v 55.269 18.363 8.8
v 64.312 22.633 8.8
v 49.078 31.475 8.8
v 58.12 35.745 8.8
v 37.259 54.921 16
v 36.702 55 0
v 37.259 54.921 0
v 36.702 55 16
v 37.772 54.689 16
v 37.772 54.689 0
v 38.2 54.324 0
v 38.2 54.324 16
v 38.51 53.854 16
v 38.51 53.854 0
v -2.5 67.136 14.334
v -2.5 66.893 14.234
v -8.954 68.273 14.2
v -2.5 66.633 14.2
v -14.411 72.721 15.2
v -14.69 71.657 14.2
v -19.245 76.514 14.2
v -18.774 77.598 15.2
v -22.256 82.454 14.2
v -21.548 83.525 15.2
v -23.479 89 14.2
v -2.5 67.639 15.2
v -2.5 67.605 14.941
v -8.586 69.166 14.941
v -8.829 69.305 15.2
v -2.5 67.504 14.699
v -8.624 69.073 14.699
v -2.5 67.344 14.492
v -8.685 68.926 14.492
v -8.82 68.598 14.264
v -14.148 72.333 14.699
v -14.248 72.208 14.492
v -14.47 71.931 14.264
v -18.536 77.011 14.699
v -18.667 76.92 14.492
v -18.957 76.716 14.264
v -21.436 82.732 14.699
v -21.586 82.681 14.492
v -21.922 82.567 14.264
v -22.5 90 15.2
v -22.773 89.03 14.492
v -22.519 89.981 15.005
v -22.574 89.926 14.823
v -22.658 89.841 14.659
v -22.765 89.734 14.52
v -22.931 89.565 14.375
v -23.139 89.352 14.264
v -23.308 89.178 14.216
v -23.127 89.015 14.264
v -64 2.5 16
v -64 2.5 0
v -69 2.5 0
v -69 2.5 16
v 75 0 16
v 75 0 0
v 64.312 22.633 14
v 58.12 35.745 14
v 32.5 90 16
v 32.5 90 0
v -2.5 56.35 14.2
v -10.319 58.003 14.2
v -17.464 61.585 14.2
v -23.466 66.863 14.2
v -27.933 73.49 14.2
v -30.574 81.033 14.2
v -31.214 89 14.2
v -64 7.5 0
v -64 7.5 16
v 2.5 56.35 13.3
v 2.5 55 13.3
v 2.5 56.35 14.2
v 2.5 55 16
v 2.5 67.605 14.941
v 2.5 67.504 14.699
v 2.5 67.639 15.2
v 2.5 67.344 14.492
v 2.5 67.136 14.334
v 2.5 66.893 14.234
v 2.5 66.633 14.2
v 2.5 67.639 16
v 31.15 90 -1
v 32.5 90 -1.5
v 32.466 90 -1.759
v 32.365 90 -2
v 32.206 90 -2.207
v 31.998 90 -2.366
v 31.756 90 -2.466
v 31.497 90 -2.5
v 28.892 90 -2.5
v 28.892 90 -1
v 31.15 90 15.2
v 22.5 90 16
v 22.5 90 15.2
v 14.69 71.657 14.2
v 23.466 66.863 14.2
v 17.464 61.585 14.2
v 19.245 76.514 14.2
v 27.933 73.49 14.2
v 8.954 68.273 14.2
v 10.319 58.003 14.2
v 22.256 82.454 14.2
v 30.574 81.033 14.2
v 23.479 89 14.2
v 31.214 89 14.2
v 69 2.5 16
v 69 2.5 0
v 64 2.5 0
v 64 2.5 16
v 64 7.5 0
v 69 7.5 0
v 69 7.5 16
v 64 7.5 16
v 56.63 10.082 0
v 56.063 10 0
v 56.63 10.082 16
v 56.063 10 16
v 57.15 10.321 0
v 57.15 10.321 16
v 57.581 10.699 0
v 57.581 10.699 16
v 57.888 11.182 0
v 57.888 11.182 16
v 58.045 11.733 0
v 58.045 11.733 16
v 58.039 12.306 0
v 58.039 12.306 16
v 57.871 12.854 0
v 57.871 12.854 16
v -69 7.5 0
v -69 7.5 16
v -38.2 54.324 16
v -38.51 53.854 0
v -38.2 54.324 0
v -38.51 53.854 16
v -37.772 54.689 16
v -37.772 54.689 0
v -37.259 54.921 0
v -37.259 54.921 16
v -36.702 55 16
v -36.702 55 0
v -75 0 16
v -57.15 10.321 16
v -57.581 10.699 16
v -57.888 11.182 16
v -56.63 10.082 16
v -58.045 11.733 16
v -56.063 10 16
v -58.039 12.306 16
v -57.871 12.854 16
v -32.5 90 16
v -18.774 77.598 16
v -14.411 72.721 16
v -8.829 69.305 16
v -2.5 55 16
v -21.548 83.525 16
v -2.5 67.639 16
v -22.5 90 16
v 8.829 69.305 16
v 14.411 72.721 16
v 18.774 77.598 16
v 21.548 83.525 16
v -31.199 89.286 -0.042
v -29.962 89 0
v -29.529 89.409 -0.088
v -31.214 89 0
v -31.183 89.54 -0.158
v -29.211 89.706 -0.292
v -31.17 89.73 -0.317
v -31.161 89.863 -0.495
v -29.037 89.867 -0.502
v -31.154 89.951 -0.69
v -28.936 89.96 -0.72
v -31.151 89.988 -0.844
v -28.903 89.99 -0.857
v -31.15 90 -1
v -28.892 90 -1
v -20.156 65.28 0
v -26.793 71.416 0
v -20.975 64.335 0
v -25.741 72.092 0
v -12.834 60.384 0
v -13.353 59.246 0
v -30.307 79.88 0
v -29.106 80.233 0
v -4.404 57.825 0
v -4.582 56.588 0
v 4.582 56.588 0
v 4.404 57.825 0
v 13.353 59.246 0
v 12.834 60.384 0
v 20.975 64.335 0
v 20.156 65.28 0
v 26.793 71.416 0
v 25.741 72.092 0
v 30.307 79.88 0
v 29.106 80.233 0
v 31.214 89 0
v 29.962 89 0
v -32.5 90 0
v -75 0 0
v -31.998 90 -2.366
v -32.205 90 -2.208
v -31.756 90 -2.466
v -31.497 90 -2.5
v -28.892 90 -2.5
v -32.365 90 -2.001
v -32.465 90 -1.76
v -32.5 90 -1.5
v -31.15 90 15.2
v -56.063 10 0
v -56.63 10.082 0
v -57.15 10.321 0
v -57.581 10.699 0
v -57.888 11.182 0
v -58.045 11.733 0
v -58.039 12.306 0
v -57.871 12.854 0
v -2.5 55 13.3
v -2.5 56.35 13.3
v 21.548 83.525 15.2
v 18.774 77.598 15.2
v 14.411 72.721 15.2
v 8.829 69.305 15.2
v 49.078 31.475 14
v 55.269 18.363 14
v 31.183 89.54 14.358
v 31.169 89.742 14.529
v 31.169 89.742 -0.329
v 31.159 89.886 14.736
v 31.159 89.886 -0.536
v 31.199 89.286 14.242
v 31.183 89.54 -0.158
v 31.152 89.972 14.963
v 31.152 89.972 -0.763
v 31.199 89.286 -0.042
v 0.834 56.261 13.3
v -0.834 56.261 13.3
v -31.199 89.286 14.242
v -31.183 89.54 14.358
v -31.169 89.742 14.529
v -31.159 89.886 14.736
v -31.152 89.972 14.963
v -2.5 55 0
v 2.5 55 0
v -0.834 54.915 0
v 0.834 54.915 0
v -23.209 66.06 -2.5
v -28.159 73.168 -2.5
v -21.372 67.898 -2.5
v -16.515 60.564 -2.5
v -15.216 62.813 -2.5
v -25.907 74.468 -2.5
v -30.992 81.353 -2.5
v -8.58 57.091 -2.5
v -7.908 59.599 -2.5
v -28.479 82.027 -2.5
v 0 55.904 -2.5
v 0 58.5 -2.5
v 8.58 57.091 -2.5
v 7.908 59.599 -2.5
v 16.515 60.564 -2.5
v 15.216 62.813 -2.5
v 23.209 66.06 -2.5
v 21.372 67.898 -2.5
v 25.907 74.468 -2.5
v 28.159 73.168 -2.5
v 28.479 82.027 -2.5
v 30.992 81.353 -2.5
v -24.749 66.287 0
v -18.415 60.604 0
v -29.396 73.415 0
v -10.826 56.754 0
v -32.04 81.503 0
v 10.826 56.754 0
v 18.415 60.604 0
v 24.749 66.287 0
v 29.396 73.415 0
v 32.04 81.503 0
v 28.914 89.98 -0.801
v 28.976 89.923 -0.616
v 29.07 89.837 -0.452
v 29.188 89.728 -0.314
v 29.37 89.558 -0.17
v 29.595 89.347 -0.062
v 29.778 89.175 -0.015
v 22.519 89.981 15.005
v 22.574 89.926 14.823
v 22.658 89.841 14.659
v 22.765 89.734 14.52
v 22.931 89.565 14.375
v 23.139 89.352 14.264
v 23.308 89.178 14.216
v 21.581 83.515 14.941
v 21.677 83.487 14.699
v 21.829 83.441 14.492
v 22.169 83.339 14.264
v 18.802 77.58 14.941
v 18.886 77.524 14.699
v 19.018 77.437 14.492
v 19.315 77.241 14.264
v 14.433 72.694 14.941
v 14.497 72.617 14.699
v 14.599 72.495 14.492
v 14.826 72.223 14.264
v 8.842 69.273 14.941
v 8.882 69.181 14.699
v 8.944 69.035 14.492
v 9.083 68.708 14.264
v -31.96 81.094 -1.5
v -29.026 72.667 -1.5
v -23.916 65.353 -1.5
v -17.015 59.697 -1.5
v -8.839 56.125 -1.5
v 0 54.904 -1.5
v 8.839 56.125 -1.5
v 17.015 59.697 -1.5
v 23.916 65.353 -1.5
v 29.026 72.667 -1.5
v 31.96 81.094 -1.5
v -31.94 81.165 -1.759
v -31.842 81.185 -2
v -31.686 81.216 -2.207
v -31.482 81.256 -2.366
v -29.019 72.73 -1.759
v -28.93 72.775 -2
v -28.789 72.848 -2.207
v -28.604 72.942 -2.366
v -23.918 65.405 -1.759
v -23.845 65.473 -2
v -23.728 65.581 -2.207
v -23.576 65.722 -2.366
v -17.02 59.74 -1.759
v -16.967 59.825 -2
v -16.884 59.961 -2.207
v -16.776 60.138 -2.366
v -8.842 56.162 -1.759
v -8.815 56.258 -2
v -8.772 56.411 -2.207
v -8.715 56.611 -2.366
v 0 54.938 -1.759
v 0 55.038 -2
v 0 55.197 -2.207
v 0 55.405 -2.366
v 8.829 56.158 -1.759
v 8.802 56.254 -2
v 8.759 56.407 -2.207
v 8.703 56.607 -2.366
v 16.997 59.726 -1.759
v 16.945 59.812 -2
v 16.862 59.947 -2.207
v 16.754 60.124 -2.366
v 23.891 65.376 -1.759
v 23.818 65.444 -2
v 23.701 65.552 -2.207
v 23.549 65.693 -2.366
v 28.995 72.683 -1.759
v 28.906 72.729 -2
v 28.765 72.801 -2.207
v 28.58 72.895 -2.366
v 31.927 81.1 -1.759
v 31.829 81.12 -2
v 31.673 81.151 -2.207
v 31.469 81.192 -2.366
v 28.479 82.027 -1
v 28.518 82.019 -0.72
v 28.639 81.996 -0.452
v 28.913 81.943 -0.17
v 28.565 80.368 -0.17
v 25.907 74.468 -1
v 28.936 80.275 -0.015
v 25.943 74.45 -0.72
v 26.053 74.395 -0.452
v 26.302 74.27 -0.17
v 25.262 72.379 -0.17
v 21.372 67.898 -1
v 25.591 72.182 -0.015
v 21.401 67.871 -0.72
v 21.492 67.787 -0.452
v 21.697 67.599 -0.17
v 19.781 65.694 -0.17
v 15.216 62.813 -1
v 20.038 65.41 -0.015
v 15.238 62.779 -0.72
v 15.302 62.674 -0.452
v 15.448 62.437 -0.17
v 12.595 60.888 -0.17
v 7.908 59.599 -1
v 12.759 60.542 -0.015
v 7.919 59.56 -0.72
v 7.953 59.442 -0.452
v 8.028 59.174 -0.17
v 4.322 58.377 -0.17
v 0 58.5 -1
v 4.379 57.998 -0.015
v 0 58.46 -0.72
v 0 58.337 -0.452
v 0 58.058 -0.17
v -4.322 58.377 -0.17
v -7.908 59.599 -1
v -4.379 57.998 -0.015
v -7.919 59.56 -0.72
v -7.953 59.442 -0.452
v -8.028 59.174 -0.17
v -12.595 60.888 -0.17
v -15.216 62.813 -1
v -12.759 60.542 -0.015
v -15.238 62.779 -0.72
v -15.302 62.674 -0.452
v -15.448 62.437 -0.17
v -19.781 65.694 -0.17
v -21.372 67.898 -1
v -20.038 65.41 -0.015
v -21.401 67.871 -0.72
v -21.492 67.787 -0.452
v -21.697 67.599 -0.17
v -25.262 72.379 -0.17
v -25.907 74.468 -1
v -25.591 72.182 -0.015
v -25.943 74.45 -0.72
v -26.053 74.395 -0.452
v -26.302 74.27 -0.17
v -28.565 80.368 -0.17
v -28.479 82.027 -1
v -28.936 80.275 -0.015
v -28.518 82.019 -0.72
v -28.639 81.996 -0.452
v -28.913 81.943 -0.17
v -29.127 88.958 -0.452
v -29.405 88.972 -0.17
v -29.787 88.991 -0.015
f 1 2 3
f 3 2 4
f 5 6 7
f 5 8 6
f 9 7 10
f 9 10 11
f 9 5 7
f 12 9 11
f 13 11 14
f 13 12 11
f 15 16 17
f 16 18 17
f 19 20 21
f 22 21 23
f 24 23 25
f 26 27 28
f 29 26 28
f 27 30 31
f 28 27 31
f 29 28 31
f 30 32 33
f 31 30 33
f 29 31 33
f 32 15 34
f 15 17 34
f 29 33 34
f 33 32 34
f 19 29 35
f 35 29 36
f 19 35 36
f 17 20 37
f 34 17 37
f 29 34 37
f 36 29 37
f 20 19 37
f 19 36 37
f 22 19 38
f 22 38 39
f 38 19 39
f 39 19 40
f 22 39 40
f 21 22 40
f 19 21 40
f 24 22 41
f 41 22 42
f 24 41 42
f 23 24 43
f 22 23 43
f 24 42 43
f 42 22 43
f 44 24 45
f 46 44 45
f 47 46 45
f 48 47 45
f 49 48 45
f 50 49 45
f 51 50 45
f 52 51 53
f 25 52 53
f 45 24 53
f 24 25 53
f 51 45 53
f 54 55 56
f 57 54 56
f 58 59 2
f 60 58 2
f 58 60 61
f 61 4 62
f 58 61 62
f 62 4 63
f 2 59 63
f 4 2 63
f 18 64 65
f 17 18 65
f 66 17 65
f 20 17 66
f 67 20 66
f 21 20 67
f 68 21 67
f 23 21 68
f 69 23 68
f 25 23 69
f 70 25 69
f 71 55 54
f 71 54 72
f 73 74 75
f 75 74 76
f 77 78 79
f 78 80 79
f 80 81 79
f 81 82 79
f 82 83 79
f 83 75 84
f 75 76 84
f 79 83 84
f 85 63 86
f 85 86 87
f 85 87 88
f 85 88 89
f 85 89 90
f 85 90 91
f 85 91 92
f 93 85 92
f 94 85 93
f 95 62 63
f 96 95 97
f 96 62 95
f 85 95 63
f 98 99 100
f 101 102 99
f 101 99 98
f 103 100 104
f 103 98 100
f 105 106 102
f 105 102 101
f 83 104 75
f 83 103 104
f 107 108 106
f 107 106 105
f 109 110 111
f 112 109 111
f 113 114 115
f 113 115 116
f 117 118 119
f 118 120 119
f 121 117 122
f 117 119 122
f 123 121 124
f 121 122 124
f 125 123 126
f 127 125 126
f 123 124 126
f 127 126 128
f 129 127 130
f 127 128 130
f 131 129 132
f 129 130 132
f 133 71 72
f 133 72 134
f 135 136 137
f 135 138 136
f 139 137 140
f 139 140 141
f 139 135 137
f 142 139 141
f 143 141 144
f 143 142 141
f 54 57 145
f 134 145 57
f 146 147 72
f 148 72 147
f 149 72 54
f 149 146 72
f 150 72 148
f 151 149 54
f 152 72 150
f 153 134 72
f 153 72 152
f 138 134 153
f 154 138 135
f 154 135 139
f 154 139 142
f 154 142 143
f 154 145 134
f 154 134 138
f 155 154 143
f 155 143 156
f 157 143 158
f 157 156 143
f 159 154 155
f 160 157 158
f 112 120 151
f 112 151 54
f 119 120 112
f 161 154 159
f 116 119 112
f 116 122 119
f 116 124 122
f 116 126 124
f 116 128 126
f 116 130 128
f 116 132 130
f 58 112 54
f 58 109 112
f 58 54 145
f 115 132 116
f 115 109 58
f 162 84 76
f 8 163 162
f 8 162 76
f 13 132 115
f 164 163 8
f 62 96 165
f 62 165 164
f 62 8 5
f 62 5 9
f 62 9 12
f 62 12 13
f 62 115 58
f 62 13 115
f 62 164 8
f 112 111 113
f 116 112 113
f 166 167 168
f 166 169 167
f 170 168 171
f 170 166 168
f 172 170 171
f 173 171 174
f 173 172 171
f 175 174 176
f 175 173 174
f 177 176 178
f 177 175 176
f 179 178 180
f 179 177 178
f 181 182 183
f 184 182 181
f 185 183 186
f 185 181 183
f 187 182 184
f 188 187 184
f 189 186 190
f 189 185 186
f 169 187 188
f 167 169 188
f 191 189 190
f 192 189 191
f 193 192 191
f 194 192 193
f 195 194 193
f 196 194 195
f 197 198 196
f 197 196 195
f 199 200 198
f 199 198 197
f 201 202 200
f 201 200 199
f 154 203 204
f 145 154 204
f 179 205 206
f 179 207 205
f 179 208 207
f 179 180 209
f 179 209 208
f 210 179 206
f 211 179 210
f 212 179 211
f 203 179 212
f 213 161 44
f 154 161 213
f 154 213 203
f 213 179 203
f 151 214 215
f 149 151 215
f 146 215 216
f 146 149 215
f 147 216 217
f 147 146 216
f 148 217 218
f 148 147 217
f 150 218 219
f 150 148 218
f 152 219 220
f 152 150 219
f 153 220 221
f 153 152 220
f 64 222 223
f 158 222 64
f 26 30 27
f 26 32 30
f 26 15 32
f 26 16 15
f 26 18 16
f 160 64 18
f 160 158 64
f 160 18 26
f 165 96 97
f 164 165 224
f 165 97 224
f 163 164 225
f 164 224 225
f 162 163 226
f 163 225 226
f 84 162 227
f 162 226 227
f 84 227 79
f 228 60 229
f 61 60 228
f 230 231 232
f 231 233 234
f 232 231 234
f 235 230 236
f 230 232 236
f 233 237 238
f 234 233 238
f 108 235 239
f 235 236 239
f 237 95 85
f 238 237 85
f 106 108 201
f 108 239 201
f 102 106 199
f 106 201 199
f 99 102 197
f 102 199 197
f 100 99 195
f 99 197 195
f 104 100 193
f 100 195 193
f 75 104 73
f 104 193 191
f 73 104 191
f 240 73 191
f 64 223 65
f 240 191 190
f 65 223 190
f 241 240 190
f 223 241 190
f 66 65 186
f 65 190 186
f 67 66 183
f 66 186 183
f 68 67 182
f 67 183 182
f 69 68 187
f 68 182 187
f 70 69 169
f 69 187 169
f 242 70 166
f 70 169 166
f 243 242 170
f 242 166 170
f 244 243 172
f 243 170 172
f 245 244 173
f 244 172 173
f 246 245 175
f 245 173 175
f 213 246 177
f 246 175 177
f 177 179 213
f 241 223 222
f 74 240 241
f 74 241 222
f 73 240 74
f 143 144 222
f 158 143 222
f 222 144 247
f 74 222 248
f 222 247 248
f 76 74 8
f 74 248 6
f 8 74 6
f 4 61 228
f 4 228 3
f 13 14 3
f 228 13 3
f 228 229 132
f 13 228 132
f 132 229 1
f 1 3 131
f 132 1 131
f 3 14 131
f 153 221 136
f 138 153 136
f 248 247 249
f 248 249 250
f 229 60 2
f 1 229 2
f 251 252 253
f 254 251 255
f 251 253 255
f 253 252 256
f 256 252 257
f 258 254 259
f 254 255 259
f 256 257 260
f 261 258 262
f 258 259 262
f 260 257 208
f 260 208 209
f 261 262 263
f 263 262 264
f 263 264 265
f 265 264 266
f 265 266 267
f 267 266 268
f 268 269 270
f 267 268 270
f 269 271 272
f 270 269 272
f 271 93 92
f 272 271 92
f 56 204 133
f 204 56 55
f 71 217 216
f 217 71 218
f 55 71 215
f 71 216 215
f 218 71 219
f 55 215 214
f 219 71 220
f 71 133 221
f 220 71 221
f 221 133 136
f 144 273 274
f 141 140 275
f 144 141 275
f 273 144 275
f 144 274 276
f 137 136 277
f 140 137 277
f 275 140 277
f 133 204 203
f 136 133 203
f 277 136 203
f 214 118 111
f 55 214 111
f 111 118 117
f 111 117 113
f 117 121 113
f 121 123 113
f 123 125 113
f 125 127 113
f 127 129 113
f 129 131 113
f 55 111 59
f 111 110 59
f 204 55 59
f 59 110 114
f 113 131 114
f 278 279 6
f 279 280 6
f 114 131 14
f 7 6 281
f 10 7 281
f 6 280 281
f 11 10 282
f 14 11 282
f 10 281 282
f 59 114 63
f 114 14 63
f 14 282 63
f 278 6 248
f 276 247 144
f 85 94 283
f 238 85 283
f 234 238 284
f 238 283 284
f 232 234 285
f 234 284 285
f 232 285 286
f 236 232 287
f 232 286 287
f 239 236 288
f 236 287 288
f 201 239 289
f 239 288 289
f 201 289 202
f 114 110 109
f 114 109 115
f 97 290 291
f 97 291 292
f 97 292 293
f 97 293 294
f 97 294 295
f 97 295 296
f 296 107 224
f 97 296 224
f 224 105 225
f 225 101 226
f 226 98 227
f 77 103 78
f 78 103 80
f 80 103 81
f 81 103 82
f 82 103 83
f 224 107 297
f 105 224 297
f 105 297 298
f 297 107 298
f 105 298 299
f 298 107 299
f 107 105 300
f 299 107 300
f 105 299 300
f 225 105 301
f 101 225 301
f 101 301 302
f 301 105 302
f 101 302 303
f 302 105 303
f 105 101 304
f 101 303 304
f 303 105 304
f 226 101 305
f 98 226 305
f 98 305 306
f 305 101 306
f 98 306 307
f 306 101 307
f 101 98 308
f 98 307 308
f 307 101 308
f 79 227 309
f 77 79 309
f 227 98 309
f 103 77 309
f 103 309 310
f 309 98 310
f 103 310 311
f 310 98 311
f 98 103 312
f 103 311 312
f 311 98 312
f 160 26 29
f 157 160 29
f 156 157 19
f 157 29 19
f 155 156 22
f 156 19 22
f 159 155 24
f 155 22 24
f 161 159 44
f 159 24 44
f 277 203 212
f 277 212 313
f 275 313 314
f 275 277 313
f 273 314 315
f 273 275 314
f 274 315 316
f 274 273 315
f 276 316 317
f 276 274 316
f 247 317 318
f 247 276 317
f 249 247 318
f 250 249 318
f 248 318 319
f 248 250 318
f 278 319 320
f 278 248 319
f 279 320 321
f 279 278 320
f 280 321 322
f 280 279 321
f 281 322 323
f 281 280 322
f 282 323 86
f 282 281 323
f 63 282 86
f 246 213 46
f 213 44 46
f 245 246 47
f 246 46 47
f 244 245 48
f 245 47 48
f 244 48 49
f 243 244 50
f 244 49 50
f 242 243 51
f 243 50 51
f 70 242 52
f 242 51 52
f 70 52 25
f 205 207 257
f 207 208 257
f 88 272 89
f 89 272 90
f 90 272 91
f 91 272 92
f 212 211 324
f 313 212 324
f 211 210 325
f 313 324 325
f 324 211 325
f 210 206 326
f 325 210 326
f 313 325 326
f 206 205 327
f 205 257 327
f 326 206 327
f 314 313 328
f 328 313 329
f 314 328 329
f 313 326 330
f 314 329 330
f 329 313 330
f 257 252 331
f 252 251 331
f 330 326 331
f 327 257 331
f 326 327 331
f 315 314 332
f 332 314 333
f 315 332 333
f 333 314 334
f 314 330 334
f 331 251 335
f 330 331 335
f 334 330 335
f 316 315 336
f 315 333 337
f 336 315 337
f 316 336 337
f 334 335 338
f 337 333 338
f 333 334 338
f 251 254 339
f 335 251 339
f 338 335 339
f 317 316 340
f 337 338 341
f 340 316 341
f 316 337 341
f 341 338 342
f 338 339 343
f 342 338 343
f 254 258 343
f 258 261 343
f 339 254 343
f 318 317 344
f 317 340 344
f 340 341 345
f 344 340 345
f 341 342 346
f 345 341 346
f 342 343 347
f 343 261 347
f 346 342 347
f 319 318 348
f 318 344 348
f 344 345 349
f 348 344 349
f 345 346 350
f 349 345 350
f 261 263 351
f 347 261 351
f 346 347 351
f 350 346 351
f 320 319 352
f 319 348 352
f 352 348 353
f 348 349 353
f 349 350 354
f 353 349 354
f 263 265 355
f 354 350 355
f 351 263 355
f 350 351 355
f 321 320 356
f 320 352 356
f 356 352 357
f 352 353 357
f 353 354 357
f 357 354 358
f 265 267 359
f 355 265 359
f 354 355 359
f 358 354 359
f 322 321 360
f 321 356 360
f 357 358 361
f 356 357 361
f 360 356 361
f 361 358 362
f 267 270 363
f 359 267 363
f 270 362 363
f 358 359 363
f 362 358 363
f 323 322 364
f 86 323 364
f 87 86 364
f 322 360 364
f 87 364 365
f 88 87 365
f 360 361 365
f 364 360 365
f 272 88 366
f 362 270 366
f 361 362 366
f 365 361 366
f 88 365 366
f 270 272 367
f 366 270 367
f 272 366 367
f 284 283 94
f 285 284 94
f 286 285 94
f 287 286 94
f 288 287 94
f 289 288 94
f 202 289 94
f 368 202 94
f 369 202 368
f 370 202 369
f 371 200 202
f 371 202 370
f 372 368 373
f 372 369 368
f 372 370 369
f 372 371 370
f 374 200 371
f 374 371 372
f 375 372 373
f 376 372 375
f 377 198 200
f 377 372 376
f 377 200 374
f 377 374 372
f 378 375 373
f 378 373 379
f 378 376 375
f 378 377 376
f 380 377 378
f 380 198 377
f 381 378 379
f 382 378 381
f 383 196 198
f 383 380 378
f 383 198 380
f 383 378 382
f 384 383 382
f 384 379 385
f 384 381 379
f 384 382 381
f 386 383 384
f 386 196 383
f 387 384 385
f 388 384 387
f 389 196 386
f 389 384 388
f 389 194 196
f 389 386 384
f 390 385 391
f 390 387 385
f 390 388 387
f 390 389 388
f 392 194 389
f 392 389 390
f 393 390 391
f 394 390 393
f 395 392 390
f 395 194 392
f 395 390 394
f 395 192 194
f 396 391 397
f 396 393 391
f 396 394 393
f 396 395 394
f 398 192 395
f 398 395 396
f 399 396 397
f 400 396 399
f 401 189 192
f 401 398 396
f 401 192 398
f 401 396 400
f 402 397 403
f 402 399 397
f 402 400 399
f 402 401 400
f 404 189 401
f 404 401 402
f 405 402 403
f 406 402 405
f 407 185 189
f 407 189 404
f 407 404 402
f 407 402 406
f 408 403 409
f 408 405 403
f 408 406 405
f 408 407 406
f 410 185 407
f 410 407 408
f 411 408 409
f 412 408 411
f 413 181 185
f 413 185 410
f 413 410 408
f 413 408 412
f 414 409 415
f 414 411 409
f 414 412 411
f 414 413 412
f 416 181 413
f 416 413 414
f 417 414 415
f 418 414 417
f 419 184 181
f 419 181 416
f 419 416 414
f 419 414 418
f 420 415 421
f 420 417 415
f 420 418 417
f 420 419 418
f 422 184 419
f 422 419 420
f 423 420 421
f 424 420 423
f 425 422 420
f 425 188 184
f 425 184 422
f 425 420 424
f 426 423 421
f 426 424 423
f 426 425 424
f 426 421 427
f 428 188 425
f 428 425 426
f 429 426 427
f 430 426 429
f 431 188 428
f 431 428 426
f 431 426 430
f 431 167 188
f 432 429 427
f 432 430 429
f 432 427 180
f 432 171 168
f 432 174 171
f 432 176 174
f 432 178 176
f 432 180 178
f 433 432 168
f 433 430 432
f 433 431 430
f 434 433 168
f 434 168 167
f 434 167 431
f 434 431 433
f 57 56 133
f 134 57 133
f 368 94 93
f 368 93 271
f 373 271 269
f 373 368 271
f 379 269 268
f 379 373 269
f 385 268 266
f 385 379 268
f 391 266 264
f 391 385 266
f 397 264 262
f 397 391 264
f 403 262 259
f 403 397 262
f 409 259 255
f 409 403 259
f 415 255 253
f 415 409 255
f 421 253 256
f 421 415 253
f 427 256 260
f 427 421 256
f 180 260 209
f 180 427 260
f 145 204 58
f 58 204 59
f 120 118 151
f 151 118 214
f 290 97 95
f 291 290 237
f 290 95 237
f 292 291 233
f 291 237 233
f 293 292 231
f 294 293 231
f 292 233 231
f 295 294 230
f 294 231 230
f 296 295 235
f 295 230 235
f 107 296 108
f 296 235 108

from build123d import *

# Parameters (mm, degrees)
BOSS_EXTRUDE1_DEPTH = 16
SKETCH2_R           = 31.25
CUT_EXTRUDE1_DEPTH  = 14.2
SKETCH3_R           = 22.5
CUT_EXTRUDE2_DEPTH  = 14.2
FILLET1_R           = 2
SKETCH4_W           = 5.2
SKETCH4_H           = 14.5
CUT_EXTRUDE3_DEPTH  = 10
SKETCH5_W           = 5
SKETCH5_H           = 5
CUT_EXTRUDE4_DEPTH  = 119.241278748
SKETCH6_W           = 5
SKETCH6_H           = 15
CUT_EXTRUDE5_DEPTH  = 2.7
BOSS_EXTRUDE2_DEPTH = 2.5
FILLET2_R           = 1
FILLET3_R           = 1


with BuildPart() as part:
    # Sketch1 → Boss-Extrude1 (new body)
    with BuildSketch(Plane.XY):
        Polygon((-75, 0), (75, 0), (32.5, 90), (-32.5, 90), align=None)
        Polygon((-59.218872646, 10), (-37.968872646, 55), (37.968872646, 55), (59.218872646, 10), align=None, mode=Mode.SUBTRACT)
    extrude(amount=BOSS_EXTRUDE1_DEPTH)

    # Sketch2 → Cut-Extrude1 (cut)
    with BuildSketch(Plane(origin=(0, 0, 0), x_dir=(-1, 0, 0), z_dir=(0, 0, -1))):
        with Locations((0, 87.5)):
            Circle(SKETCH2_R)
    extrude(amount=-CUT_EXTRUDE1_DEPTH, mode=Mode.SUBTRACT)

    # Sketch3 → Cut-Extrude2 (cut)
    with BuildSketch(Plane(origin=(0, 0, 14.2), x_dir=(-1, 0, 0), z_dir=(0, 0, -1))):
        with Locations((0, 90)):
            Circle(SKETCH3_R)
    extrude(amount=-CUT_EXTRUDE2_DEPTH, mode=Mode.SUBTRACT)

    # Fillet1
    fillet1_edges = [part.edges().sort_by_distance(p)[0] for p in [
        (59.218872646, 10, 8),
        (37.968872646, 55, 8),
        (-37.968872646, 55, 8),
        (-59.218872646, 10, 8),
    ]]
    fillet(fillet1_edges, radius=FILLET1_R)

    # Sketch4 → Cut-Extrude3 (cut)
    with BuildSketch(Plane(origin=(61.324921136, 28.958990536, 0), x_dir=(0, 0, -1), z_dir=(0.9042486467459909, 0.42700630540782925, 0))):
        with Locations((-11.4, 0.254673281)):
            Rectangle(SKETCH4_W, SKETCH4_H)
    extrude(amount=-CUT_EXTRUDE3_DEPTH, mode=Mode.SUBTRACT)

    # Sketch5 → Cut-Extrude4 (cut, through all)
    with BuildSketch(Plane(origin=(0, 0, 0), x_dir=(-1, 0, 0), z_dir=(0, 0, -1))):
        with Locations((-66.5, 5)):
            Rectangle(SKETCH5_W, SKETCH5_H)
        with Locations((66.5, 5)):
            Rectangle(SKETCH5_W, SKETCH5_H)
    extrude(amount=-CUT_EXTRUDE4_DEPTH, mode=Mode.SUBTRACT)

    # Sketch6 → Cut-Extrude5 (cut)
    with BuildSketch(Plane.XY.offset(16)):
        with Locations((0, 62.5)):
            Rectangle(SKETCH6_W, SKETCH6_H)
    extrude(amount=-CUT_EXTRUDE5_DEPTH, mode=Mode.SUBTRACT)

    # Sketch7 → Boss-Extrude2 (add)
    with BuildSketch(Plane(origin=(0, 0, 0), x_dir=(-1, 0, 0), z_dir=(0, 0, -1))):
        with BuildLine():
            Line((-32.5, 90), (-28.892040426, 90))
            ThreePointArc((-28.892040426, 90), (0, 58.5), (28.892040426, 90))
            Line((28.892040426, 90), (32.5, 90))
            ThreePointArc((32.5, 90), (0, 54.903987974), (-32.5, 90))
        make_face()
    extrude(amount=BOSS_EXTRUDE2_DEPTH)

    # Fillet2
    fillet2_edges = [part.edges().sort_by_distance(p)[0] for p in [
        (0, 54.903987974, -2.5),
    ]]
    fillet(fillet2_edges, radius=FILLET2_R)

    # Fillet3
    fillet3_edges = [part.edges().sort_by_distance(p)[0] for p in [
        (-16.770509831, 75, 14.2),
        (-30.020939956, 90, 0),
        (0, 58.5, 0),
        (30.020939956, 90, 0),
        (-26.824919743, 90, 14.2),
        (26.824919743, 90, 14.2),
        (16.770509831, 75, 14.2),
    ]]
    fillet(fillet3_edges, radius=FILLET3_R)


solid = part.part
